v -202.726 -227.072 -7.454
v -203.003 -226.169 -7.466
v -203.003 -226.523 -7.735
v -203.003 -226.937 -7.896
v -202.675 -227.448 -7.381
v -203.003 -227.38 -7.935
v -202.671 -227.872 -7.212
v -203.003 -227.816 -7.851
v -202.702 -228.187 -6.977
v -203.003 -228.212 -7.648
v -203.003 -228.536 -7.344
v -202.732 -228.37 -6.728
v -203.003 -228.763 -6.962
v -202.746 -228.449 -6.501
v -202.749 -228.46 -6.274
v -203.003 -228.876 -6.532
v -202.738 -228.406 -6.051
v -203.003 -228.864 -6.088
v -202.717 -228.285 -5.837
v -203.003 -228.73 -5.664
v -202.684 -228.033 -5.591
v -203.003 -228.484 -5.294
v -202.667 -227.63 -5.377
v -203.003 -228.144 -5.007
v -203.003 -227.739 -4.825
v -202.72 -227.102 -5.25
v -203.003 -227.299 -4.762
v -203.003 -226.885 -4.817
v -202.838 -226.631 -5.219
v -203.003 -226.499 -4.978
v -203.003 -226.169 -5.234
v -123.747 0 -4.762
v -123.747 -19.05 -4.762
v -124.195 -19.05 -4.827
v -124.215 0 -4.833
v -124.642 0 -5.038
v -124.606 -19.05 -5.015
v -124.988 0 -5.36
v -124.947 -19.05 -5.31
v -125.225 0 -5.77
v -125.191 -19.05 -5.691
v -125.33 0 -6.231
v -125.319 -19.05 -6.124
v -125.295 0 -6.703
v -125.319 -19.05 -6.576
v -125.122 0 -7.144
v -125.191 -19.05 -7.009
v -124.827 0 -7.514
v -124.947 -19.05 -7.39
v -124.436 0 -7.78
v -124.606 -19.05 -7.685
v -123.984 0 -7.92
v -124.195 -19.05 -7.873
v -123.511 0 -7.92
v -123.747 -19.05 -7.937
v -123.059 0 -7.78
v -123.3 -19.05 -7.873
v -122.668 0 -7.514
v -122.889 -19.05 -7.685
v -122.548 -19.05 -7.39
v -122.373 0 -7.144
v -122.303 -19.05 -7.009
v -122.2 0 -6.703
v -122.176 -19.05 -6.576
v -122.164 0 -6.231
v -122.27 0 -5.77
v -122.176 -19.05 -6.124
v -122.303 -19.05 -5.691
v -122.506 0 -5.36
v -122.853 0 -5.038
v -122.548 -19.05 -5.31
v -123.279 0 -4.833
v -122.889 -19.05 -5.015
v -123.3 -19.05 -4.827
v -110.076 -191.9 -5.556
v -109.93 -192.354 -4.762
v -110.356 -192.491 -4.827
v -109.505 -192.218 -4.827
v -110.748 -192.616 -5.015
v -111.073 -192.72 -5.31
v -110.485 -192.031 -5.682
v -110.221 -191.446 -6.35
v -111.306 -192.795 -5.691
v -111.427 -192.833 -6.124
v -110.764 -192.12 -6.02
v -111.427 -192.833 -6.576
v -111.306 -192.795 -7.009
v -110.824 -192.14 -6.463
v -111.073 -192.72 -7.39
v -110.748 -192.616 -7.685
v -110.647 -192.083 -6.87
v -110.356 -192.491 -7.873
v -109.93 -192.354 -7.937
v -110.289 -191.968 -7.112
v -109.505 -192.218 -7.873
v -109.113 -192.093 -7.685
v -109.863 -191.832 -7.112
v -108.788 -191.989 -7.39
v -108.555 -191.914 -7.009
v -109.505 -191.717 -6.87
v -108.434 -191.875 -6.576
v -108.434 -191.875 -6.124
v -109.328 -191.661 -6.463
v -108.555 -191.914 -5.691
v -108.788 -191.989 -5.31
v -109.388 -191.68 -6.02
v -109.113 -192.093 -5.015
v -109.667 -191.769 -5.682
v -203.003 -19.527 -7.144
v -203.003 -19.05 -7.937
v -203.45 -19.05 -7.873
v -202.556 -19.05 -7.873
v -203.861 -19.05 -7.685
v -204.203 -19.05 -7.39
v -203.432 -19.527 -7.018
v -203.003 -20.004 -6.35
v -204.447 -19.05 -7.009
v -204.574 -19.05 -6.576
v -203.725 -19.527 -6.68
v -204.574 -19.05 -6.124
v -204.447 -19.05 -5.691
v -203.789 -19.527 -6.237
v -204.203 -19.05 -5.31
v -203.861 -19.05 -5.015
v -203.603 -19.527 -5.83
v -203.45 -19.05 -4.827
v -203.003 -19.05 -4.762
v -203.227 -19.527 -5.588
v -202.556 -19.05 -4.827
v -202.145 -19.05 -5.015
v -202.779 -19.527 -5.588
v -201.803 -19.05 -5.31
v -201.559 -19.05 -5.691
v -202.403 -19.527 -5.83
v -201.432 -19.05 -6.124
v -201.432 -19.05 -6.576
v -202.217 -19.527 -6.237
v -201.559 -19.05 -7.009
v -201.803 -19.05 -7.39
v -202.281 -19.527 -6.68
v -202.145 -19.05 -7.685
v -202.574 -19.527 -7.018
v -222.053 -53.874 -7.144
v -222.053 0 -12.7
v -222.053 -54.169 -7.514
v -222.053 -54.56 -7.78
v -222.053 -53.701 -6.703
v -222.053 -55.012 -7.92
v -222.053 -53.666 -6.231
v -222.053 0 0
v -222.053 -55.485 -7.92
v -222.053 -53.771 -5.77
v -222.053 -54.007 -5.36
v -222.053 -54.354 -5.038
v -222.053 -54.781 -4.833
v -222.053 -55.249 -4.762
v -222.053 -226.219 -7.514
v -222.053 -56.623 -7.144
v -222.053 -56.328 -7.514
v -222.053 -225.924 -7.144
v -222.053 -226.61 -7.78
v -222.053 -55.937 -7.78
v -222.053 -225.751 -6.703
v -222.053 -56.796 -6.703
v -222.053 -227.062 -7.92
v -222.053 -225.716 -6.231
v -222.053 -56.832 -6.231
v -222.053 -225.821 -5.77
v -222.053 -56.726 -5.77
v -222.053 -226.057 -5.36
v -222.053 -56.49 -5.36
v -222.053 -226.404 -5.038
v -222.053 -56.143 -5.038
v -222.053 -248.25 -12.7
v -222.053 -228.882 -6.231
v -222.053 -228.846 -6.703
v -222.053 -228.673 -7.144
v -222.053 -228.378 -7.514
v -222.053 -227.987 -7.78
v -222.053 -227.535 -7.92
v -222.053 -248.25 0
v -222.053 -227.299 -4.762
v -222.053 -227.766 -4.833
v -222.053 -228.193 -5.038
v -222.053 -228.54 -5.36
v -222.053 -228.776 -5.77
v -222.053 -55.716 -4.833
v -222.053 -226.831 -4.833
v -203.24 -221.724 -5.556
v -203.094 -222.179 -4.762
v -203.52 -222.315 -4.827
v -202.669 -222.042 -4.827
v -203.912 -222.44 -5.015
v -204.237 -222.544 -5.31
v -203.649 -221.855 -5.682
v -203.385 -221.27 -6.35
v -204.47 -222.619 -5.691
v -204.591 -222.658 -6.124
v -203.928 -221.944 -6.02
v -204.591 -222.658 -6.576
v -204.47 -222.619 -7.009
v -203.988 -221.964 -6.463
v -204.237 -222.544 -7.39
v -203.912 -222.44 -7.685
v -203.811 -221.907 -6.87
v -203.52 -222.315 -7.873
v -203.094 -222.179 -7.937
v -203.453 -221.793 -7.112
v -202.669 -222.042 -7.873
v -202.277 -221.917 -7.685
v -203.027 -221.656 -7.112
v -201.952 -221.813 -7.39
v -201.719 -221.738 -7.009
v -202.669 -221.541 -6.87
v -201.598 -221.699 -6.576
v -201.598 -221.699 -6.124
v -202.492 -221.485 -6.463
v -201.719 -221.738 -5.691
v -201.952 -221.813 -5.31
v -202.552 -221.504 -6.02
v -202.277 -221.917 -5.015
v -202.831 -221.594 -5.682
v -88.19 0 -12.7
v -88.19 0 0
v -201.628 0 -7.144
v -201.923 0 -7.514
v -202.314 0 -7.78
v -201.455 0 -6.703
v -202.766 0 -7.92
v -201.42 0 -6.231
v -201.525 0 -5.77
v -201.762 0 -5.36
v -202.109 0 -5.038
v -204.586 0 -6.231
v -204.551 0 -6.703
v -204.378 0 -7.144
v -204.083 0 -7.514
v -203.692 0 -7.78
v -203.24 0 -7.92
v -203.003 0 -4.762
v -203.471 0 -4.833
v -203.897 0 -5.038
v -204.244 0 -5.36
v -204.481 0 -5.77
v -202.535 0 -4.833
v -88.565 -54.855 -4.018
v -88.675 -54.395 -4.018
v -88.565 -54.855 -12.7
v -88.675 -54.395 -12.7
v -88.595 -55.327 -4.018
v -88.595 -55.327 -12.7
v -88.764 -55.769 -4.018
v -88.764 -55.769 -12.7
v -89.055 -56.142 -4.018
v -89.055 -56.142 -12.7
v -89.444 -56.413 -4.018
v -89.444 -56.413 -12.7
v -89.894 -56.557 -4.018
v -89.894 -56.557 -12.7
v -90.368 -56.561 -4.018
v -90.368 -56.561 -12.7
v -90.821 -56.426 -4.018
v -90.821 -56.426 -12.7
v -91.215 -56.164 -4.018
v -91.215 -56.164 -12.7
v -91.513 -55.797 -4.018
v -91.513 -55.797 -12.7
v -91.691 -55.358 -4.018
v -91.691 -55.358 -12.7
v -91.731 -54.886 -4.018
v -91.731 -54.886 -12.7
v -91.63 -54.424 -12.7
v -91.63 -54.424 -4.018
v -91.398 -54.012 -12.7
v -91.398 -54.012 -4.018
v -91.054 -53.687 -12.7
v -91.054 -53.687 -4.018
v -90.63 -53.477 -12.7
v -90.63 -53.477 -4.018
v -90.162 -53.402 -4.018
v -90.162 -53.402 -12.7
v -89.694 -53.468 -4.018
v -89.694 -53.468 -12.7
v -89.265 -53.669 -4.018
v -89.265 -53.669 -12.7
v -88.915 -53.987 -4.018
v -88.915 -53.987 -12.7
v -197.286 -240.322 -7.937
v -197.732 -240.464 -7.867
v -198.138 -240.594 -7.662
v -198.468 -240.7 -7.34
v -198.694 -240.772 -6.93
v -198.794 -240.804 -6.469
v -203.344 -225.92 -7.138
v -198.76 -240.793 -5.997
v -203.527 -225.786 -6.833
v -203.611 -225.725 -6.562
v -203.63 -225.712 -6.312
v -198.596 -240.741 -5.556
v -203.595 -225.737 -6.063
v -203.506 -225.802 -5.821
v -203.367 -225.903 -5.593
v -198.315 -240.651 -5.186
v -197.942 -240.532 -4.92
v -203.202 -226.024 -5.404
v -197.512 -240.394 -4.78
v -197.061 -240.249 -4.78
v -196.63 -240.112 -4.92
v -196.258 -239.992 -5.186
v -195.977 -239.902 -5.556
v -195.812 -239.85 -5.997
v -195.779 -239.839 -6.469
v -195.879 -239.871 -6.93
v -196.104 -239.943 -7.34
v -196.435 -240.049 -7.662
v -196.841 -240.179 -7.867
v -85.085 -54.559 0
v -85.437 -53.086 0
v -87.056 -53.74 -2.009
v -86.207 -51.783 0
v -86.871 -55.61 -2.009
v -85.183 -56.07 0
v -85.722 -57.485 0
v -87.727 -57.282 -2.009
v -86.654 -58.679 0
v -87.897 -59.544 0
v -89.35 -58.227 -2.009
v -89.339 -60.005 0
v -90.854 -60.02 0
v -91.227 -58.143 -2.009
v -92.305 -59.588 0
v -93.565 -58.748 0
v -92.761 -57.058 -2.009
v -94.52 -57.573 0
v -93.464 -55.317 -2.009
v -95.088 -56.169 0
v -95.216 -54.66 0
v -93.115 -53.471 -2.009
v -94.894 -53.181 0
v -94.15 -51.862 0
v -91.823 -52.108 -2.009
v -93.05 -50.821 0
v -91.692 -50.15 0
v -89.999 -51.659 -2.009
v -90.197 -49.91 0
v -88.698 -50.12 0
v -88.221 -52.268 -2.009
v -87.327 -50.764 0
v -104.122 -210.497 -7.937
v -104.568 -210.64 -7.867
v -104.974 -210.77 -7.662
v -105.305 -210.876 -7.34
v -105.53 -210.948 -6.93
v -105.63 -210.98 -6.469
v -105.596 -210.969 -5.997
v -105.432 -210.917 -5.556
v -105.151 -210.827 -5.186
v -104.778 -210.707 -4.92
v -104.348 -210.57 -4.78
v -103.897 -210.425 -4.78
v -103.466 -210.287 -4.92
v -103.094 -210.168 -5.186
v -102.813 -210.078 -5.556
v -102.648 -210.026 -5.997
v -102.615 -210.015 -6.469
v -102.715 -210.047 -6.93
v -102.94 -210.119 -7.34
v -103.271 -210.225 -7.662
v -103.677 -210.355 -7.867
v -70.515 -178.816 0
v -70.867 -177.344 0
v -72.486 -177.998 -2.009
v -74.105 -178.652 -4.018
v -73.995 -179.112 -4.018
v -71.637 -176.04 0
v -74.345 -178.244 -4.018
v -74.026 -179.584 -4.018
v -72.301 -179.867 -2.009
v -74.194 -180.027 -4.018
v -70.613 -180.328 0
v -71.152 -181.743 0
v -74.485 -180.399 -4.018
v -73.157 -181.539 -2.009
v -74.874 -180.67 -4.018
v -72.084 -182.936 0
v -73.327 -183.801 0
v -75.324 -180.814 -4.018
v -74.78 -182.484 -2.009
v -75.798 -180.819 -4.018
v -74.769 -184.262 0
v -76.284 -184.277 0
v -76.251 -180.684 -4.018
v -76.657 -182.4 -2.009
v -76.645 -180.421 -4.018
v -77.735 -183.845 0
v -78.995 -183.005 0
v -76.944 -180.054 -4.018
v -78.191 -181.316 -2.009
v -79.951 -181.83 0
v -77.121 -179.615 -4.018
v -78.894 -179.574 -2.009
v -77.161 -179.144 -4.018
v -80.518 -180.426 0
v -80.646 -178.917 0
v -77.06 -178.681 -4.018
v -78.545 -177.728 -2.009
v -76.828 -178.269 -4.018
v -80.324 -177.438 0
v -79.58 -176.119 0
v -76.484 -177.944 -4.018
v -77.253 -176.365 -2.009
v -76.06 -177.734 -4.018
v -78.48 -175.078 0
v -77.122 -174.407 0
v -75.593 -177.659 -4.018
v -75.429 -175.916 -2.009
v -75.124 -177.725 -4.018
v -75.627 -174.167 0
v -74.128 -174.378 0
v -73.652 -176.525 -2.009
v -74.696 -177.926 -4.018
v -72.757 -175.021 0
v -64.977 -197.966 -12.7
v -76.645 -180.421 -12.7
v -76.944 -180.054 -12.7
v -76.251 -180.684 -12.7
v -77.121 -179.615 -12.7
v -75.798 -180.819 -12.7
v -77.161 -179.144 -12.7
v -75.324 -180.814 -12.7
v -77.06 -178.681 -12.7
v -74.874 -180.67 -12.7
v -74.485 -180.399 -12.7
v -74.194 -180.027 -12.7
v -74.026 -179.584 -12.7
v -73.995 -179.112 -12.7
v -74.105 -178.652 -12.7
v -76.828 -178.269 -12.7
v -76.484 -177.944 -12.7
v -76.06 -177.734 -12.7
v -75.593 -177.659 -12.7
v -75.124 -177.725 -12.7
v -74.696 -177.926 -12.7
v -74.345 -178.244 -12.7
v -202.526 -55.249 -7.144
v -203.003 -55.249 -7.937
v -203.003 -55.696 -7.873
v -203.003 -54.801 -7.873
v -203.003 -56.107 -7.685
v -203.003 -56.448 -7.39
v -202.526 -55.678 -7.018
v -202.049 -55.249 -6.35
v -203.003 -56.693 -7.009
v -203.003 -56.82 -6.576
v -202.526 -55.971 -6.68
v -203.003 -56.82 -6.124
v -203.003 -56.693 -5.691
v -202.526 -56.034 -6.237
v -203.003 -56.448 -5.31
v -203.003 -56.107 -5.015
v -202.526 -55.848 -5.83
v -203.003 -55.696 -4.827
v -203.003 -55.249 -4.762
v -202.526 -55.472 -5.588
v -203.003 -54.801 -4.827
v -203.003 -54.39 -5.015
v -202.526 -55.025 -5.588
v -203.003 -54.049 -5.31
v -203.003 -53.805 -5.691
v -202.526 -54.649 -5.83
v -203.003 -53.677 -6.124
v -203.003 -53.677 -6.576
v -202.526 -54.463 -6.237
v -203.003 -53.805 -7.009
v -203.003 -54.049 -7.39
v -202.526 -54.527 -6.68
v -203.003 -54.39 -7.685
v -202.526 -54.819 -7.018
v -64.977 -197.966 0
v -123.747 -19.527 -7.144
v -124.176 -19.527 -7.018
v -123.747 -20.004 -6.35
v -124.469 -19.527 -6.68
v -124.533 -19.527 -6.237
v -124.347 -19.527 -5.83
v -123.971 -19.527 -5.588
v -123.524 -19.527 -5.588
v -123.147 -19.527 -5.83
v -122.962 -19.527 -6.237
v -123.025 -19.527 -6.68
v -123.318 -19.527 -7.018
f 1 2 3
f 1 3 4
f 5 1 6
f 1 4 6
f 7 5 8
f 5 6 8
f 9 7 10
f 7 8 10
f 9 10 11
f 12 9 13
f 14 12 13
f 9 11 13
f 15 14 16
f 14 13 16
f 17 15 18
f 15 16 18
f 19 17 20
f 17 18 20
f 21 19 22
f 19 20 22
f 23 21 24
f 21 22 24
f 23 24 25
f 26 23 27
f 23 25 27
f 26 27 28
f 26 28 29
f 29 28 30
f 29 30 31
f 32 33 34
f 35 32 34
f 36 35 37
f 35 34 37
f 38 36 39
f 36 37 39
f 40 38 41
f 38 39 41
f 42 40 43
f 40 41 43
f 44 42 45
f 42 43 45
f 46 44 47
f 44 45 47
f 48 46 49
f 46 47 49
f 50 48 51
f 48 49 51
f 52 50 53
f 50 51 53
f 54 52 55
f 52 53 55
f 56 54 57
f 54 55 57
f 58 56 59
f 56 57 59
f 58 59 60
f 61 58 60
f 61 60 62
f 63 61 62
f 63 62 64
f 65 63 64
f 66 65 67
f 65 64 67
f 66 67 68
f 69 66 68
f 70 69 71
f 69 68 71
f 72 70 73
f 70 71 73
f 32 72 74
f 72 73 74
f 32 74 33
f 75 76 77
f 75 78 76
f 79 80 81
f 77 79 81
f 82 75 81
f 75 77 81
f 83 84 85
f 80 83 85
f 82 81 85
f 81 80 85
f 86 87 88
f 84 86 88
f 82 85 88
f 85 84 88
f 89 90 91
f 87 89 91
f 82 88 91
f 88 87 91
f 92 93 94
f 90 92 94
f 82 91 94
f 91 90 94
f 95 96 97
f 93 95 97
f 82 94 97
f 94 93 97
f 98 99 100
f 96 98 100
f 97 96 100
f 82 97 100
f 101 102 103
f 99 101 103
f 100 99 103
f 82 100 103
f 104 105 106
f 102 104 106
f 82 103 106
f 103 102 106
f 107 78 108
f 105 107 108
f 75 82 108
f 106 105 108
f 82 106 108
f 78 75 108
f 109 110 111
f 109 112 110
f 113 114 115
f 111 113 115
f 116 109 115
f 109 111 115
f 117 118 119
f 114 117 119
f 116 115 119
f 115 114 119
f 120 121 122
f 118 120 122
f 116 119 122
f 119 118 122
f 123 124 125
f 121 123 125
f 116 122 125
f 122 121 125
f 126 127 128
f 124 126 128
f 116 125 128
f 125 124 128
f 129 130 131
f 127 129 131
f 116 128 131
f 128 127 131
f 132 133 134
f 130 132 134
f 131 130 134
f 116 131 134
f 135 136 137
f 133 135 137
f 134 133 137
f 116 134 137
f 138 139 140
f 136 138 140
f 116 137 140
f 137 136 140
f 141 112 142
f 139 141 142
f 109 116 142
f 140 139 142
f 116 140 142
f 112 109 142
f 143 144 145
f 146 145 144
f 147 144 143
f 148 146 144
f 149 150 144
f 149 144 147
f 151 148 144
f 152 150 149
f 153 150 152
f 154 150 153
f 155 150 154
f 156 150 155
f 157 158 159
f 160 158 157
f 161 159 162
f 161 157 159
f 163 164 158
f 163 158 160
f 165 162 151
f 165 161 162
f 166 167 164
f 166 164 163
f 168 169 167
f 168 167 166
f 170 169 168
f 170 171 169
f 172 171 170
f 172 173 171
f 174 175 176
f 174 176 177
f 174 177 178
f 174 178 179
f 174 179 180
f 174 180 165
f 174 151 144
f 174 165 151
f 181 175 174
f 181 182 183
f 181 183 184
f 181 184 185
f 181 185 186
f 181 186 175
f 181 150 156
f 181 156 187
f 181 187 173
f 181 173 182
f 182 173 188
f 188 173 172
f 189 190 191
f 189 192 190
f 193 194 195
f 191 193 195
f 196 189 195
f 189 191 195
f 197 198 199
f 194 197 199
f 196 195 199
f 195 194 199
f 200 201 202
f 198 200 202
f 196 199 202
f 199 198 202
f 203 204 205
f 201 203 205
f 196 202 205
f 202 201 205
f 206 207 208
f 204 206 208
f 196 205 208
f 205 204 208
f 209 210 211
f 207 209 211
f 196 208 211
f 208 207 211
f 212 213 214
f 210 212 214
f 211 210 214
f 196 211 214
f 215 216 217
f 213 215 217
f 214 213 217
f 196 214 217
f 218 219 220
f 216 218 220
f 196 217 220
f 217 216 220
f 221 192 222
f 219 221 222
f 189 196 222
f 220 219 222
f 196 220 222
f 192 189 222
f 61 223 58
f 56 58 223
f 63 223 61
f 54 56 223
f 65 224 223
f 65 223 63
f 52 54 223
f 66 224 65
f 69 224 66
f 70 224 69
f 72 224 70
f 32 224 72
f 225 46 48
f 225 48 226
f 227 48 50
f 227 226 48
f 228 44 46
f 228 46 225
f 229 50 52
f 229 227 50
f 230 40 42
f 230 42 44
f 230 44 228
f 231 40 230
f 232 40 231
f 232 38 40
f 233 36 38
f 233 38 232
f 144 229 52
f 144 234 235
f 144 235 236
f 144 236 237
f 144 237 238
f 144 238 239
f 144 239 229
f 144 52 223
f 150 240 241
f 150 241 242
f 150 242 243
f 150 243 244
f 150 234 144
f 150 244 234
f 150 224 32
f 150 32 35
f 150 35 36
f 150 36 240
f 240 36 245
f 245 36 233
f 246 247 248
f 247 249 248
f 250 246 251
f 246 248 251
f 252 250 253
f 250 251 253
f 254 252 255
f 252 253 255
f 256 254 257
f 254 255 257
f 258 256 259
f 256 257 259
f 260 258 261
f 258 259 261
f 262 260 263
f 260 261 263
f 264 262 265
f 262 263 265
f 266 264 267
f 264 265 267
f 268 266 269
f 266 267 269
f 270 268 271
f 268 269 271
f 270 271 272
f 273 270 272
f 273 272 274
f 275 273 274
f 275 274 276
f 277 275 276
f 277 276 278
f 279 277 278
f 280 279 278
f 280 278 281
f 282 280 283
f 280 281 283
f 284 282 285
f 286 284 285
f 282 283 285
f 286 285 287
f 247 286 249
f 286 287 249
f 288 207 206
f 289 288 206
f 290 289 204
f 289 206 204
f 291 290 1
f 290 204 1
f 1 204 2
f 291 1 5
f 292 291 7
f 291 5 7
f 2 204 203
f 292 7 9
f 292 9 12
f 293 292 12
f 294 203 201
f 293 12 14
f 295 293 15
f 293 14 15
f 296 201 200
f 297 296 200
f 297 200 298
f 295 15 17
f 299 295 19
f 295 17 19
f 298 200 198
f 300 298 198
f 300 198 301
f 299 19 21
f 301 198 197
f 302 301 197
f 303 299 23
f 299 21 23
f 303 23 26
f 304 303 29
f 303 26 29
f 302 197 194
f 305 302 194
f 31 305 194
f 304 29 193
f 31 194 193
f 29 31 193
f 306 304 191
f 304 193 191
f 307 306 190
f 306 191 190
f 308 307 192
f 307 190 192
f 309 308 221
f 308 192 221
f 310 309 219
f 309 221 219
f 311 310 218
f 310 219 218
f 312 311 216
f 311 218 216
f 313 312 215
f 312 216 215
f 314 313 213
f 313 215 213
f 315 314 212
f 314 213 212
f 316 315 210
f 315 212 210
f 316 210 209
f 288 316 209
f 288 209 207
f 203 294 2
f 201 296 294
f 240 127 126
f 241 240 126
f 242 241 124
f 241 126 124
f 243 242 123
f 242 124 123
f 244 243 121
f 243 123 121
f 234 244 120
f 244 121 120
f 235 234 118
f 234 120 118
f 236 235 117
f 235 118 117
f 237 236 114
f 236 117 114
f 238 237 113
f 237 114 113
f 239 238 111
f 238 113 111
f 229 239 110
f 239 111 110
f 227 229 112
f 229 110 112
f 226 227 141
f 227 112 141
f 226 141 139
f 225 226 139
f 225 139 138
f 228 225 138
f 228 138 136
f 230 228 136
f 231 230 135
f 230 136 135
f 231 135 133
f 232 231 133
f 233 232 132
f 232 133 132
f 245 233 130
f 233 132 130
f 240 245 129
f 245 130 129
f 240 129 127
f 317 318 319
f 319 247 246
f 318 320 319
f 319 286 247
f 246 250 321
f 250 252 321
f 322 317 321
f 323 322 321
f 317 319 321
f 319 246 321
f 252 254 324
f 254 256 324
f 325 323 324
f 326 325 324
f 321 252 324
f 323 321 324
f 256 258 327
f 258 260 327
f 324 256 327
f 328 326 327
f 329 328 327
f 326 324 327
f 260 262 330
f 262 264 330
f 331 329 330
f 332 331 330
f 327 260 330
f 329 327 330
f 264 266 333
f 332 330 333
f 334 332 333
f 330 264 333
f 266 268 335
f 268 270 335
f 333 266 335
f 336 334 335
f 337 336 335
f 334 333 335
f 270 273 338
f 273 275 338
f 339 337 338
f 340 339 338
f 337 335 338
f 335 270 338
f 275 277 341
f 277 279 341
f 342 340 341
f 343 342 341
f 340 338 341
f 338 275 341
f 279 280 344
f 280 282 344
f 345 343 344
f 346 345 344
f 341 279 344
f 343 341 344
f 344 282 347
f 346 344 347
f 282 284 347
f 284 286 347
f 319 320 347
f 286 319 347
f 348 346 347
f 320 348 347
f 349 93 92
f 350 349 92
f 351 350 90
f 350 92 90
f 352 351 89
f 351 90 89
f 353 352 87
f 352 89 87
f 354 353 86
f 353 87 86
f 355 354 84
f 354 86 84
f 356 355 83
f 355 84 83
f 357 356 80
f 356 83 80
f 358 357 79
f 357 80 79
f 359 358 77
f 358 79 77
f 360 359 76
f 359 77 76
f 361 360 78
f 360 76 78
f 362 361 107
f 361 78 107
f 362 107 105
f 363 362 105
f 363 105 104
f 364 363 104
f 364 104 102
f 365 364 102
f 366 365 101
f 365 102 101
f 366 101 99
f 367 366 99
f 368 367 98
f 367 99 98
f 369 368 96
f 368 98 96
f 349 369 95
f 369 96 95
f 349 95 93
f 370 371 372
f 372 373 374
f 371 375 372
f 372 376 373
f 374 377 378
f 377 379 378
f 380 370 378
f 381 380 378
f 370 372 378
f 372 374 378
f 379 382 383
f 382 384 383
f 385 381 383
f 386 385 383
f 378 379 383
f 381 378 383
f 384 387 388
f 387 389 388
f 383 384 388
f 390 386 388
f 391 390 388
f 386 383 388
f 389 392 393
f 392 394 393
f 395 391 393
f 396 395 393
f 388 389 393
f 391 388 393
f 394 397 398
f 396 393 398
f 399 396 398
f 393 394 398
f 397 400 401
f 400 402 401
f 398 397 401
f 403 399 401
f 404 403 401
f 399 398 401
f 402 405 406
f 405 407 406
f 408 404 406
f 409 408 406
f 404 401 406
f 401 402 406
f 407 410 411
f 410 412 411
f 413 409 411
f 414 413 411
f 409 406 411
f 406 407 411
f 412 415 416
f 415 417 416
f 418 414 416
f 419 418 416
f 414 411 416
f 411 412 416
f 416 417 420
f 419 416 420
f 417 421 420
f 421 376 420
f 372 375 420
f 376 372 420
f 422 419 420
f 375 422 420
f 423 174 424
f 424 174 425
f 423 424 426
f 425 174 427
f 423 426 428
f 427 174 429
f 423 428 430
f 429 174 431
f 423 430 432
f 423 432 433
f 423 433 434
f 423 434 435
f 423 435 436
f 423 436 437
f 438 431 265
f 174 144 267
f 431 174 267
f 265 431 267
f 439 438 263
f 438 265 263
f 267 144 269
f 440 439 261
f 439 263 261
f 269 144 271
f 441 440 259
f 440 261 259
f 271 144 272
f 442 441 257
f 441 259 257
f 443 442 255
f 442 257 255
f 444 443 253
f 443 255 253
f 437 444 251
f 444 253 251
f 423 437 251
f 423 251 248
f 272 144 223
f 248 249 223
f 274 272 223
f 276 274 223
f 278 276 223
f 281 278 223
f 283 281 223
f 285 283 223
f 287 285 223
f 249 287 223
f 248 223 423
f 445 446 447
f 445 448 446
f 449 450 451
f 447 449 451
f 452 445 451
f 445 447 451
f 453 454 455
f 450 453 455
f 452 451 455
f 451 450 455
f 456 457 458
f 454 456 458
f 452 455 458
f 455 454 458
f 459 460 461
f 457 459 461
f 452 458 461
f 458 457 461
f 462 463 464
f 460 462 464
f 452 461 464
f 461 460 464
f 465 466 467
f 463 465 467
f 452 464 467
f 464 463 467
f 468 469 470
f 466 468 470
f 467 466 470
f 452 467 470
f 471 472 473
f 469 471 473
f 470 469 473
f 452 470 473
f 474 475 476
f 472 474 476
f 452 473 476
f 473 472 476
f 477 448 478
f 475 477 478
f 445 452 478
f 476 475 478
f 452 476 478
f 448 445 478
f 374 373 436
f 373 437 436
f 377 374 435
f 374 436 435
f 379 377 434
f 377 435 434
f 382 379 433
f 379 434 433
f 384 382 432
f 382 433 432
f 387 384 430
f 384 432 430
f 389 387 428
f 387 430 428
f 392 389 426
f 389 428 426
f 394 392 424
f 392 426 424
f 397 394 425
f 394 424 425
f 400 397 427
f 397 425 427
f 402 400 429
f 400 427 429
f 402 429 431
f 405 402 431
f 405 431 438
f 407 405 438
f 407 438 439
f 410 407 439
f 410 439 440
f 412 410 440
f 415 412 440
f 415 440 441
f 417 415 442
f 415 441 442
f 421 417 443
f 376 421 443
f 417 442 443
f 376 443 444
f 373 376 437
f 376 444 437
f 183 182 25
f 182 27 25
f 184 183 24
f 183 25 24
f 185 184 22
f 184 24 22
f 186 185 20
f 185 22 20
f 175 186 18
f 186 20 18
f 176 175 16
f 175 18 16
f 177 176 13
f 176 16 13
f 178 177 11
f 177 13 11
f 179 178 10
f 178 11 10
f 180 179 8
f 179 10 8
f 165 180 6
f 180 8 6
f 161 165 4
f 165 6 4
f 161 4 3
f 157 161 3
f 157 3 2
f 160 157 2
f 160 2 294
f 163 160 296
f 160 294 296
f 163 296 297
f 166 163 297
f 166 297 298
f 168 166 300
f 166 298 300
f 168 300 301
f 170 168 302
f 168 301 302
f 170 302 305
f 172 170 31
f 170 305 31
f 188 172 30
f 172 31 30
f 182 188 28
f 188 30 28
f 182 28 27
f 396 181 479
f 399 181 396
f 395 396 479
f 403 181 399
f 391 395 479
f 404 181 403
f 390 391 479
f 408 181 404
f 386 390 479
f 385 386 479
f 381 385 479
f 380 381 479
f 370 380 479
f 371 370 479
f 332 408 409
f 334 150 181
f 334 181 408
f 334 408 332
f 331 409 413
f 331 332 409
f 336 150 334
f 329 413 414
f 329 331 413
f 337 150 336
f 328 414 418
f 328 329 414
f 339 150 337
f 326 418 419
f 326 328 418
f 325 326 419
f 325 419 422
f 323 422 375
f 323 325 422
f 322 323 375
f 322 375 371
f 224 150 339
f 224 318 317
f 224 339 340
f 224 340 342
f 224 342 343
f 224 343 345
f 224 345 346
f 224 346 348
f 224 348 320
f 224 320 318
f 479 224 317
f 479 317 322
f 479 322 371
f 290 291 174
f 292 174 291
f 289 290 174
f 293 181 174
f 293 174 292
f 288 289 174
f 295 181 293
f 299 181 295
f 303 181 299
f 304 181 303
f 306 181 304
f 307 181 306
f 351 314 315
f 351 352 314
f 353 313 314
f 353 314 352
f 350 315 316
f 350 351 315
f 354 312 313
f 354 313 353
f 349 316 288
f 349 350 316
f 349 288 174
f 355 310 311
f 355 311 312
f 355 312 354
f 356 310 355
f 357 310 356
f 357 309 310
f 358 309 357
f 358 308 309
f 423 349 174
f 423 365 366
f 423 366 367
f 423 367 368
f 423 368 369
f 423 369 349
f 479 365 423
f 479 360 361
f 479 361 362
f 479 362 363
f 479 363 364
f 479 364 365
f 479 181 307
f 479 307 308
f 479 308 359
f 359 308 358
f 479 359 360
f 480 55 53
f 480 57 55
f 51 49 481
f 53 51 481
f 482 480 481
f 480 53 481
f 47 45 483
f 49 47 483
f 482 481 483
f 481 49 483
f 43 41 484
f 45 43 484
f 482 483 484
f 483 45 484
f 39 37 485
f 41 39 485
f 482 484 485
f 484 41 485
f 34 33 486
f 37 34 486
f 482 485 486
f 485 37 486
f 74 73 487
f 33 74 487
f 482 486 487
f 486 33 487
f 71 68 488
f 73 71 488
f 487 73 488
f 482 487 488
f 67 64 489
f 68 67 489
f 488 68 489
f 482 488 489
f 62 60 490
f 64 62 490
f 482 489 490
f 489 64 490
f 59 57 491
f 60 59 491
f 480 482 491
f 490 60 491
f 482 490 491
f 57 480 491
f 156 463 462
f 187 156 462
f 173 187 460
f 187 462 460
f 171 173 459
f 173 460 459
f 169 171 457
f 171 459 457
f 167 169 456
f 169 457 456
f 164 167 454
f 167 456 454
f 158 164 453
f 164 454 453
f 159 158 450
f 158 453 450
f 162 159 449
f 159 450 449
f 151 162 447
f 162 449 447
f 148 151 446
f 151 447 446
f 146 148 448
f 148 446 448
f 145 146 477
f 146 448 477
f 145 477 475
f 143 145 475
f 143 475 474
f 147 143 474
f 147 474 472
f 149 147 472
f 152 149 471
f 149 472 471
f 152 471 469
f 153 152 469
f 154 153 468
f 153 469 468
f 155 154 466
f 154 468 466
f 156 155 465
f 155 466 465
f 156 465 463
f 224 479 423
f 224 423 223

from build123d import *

# Parameters (mm, degrees)
BOSS_EXTRUDE1_DEPTH = 12.7
HOLE3_D             = 3.175
HOLE3_DEPTH         = 31.75
HOLE3_CSINK_D       = 10.16
HOLE3_CSINK_ANGLE   = 82
HOLE3_TIP           = 0.953866233
HOLE6_D             = 3.175
HOLE6_DEPTH         = 38.1
HOLE6_CSINK_D       = 10.16
HOLE6_CSINK_ANGLE   = 82
HOLE6_TIP           = 0.953866233
HOLE7_D             = 3.175
HOLE7_DEPTH         = 31.75
HOLE7_CSINK_D       = 10.16
HOLE7_CSINK_ANGLE   = 82
HOLE7_TIP           = 0.953866233
HOLE8_D             = 3.175
HOLE8_DEPTH         = 31.75
HOLE8_CSINK_D       = 10.16
HOLE8_CSINK_ANGLE   = 82
HOLE8_TIP           = 0.953866233


with BuildPart() as part:
    # Sketch1 → Boss-Extrude1 (new body)
    with BuildSketch(Plane.XY):
        Polygon((-88.190159952, 0), (-222.052967181, 0), (-222.052967181, -248.25), (-64.977416983, -197.966048293), align=None)
    extrude(amount=-BOSS_EXTRUDE1_DEPTH)

    # Hole3
    with Locations(Plane(origin=(-234.752967181, 1073.364195846, -135.816741379), x_dir=(0, 0, -1), z_dir=(-1, 0, 0))):
        with Locations((-129.466741379, 1300.662770337), (-129.466741379, 1128.612770337), (129.198788767, 1128.612770337), (129.198788767, 1300.662770337)):
            CounterSinkHole(HOLE3_D / 2, HOLE3_CSINK_D / 2, depth=HOLE3_DEPTH, counter_sink_angle=HOLE3_CSINK_ANGLE)
            with Locations((0, 0, -(HOLE3_DEPTH + HOLE3_TIP / 2))):  # 118° drill point
                Cone(0, HOLE3_D / 2, HOLE3_TIP, mode=Mode.SUBTRACT)

    # Hole6
    with Locations(Plane(origin=(181.039434513, 1073.364195846, 0), x_dir=(-0.9271838545667885, -0.3746065934159093, 0), z_dir=(0, 0, 1))):
        with Locations((707.166557203, 1065.270372796), (674.127983646, 944.603090451)):
            CounterSinkHole(HOLE6_D / 2, HOLE6_CSINK_D / 2, depth=HOLE6_DEPTH, counter_sink_angle=HOLE6_CSINK_ANGLE)
            with Locations((0, 0, -(HOLE6_DEPTH + HOLE6_TIP / 2))):  # 118° drill point
                Cone(0, HOLE6_D / 2, HOLE6_TIP, mode=Mode.SUBTRACT)

    # Hole7
    with Locations(Plane(origin=(181.039434513, 12.7, -135.816741379), x_dir=(0, 0, -1), z_dir=(0, 1, 0))):
        with Locations((129.198788767, 384.042401694), (-129.466741379, 384.042401694), (-129.466741379, 304.786761906), (-110.416741379, 409.442401694), (-0.133976306, 409.442401694), (110.148788767, 409.442401694), (129.198788767, 304.786761906)):
            CounterSinkHole(HOLE7_D / 2, HOLE7_CSINK_D / 2, depth=HOLE7_DEPTH, counter_sink_angle=HOLE7_CSINK_ANGLE)
            with Locations((0, 0, -(HOLE7_DEPTH + HOLE7_TIP / 2))):  # 118° drill point
                Cone(0, HOLE7_D / 2, HOLE7_TIP, mode=Mode.SUBTRACT)

    # Hole8
    with Locations(Plane(origin=(531.197640696, -20.449854654, -135.816741379), x_dir=(0, 0, 1), z_dir=(0.3048844921716131, -0.9523893355310409, 0))):
        with Locations((-129.257383629, 761.035393152), (129.466741379, 663.01461615), (129.466741379, 760.835922116), (-129.408220012, 663.214203478)):
            CounterSinkHole(HOLE8_D / 2, HOLE8_CSINK_D / 2, depth=HOLE8_DEPTH, counter_sink_angle=HOLE8_CSINK_ANGLE)
            with Locations((0, 0, -(HOLE8_DEPTH + HOLE8_TIP / 2))):  # 118° drill point
                Cone(0, HOLE8_D / 2, HOLE8_TIP, mode=Mode.SUBTRACT)


solid = part.part
